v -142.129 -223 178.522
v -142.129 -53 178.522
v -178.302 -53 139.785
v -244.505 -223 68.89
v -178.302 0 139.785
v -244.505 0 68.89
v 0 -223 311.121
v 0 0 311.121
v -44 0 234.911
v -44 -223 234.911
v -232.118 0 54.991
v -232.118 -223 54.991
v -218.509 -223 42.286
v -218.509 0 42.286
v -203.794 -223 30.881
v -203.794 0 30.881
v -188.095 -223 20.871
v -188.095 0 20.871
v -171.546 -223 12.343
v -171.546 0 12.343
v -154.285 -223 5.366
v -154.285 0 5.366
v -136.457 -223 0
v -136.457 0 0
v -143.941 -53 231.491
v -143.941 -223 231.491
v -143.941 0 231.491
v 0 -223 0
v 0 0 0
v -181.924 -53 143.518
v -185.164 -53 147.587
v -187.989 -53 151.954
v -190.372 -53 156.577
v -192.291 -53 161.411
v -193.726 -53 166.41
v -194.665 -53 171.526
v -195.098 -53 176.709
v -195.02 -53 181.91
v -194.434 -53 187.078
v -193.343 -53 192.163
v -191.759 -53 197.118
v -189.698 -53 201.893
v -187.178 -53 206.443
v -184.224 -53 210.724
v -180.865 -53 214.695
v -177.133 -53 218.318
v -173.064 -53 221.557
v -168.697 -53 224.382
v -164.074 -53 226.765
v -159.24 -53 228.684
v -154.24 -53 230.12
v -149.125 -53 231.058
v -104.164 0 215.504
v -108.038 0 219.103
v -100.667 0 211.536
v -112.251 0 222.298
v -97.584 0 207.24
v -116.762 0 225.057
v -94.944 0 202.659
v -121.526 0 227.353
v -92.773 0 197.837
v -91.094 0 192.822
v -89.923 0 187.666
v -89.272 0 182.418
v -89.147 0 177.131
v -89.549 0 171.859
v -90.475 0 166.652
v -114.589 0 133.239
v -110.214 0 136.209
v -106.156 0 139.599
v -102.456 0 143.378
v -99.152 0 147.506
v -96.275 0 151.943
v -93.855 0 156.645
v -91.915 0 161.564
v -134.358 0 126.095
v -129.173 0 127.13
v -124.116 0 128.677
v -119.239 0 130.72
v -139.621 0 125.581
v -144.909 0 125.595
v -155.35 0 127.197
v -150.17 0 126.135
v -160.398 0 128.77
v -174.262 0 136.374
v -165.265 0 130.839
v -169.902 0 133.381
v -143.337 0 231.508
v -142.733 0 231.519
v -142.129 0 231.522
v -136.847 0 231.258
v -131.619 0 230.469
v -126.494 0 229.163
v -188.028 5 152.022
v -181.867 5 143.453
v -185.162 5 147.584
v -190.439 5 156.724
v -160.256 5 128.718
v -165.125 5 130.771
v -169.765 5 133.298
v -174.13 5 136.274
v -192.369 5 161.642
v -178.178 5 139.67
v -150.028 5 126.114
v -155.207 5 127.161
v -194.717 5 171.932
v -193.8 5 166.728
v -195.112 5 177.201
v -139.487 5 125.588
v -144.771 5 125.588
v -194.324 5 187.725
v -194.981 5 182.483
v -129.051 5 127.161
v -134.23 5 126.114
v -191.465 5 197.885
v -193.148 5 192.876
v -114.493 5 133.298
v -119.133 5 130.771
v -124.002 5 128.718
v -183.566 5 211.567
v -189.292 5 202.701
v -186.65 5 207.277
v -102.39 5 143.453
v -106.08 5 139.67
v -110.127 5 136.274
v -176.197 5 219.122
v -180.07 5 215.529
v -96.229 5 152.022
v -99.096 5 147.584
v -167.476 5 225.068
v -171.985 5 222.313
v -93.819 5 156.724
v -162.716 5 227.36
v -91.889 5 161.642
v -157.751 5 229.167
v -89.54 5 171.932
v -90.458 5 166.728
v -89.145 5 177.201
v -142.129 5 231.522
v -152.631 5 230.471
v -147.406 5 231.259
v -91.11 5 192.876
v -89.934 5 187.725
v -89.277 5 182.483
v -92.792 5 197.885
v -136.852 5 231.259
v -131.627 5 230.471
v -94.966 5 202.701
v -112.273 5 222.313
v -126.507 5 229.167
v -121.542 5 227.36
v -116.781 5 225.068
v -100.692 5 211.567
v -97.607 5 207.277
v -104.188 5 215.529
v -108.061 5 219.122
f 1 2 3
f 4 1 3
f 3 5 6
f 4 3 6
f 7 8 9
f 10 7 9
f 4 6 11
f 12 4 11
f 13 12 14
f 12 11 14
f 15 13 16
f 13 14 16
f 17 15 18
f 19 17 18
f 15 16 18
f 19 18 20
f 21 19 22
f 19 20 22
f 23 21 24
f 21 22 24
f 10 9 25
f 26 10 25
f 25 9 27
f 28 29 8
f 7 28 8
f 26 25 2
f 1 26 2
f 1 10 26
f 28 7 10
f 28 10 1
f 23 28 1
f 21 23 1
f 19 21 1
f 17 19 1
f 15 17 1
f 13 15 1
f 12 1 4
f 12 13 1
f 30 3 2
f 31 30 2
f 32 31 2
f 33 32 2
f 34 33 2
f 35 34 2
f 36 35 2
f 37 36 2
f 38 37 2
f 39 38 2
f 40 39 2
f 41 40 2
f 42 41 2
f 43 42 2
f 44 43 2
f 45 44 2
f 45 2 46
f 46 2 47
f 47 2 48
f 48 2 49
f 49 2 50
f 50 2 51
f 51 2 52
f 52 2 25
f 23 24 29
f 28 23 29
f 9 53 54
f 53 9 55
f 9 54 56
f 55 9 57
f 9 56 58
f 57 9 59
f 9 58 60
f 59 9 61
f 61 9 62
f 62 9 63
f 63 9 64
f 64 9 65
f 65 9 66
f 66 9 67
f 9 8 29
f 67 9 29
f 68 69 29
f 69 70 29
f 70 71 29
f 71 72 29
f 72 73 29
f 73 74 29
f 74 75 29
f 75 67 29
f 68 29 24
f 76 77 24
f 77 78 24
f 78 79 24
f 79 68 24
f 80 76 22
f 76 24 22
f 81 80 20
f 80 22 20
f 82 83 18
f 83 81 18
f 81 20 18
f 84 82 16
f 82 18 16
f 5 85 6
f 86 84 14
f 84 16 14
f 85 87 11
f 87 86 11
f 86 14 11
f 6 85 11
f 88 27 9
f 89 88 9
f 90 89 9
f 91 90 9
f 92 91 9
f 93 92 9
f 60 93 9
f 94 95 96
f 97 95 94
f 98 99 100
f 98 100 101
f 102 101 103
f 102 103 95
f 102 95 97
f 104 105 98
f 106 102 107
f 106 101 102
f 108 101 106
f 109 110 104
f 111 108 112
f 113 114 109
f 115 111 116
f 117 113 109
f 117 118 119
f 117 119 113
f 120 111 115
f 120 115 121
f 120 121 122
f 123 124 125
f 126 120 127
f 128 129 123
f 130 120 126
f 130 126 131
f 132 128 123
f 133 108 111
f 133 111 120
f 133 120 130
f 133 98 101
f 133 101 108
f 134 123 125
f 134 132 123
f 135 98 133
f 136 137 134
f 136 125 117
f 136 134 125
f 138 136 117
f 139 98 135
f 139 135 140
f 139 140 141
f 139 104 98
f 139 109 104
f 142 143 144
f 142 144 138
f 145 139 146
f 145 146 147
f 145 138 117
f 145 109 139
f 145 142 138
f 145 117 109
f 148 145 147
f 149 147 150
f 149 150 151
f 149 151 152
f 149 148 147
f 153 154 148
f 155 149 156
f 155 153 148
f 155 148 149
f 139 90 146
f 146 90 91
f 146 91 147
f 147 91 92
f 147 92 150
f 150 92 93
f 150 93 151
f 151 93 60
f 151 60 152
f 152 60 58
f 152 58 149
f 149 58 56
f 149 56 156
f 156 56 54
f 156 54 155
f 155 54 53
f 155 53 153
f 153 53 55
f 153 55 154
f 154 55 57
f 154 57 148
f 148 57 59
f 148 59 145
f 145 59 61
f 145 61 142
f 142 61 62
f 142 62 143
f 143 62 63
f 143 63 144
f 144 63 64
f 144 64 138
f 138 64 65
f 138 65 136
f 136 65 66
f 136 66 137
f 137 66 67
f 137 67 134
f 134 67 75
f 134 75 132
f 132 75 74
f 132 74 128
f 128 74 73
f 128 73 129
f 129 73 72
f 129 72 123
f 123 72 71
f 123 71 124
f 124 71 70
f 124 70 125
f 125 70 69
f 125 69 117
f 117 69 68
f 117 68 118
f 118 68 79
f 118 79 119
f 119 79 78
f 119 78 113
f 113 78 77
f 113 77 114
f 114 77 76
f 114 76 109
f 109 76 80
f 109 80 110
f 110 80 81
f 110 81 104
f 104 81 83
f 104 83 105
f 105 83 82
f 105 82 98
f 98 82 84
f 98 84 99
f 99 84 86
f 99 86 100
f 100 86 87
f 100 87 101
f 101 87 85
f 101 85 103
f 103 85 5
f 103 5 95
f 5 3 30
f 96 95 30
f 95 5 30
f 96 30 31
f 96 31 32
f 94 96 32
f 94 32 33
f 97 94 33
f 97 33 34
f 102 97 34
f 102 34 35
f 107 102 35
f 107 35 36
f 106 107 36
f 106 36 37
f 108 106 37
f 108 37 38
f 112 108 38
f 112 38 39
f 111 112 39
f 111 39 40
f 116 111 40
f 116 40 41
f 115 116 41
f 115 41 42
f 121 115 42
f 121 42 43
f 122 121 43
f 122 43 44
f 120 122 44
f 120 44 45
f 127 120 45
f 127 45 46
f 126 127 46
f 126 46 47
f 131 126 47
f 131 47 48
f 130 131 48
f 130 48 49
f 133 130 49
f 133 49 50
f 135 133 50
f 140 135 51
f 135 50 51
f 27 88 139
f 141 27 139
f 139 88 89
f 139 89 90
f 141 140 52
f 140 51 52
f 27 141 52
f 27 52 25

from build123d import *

# Parameters (mm, degrees)
BOSS_EXTRUDE1_DEPTH      = 223
BOSS_EXTRUDE2_DEPTH      = 5
BOSS_EXTRUDE2_DEPTH_BACK = 53
SKETCH3_R                = 53


with BuildPart() as part:
    # Sketch2 → Boss-Extrude1 (new body)
    with BuildSketch(Plane(origin=(0, 0, 0), x_dir=(1, 0, 0), z_dir=(0, 1, 0))):
        with BuildLine():
            Line((0, 0), (0, -311.121367585))
            Line((0, -311.121367585), (-44, -234.911132052))
            Line((-44, -234.911132052), (-143.9414944, -231.490942435))
            Line((-143.9414944, -231.490942435), (-142.128793904, -178.521950403))
            Line((-142.128793904, -178.521950403), (-244.505097616, -68.890328878))
            ThreePointArc((-244.505097616, -68.890328878), (-196.059281714, -25.695998193), (-136.456740169, 0))
            Line((-136.456740169, 0), (0, 0))
        make_face()
    extrude(amount=-BOSS_EXTRUDE1_DEPTH)

    # Sketch3 → Boss-Extrude2 (add, two sides: drawn at the far end of the back side and taken through both)
    with BuildSketch(Plane(origin=(0, 0, 0), x_dir=(1, 0, 0), z_dir=(0, 1, 0)).offset(-BOSS_EXTRUDE2_DEPTH_BACK)):
        with Locations(Location((-142.128793904, -178.521950403, 0), (0, 0, 270))):
            Circle(SKETCH3_R)
    extrude(amount=BOSS_EXTRUDE2_DEPTH + BOSS_EXTRUDE2_DEPTH_BACK)


solid = part.part
